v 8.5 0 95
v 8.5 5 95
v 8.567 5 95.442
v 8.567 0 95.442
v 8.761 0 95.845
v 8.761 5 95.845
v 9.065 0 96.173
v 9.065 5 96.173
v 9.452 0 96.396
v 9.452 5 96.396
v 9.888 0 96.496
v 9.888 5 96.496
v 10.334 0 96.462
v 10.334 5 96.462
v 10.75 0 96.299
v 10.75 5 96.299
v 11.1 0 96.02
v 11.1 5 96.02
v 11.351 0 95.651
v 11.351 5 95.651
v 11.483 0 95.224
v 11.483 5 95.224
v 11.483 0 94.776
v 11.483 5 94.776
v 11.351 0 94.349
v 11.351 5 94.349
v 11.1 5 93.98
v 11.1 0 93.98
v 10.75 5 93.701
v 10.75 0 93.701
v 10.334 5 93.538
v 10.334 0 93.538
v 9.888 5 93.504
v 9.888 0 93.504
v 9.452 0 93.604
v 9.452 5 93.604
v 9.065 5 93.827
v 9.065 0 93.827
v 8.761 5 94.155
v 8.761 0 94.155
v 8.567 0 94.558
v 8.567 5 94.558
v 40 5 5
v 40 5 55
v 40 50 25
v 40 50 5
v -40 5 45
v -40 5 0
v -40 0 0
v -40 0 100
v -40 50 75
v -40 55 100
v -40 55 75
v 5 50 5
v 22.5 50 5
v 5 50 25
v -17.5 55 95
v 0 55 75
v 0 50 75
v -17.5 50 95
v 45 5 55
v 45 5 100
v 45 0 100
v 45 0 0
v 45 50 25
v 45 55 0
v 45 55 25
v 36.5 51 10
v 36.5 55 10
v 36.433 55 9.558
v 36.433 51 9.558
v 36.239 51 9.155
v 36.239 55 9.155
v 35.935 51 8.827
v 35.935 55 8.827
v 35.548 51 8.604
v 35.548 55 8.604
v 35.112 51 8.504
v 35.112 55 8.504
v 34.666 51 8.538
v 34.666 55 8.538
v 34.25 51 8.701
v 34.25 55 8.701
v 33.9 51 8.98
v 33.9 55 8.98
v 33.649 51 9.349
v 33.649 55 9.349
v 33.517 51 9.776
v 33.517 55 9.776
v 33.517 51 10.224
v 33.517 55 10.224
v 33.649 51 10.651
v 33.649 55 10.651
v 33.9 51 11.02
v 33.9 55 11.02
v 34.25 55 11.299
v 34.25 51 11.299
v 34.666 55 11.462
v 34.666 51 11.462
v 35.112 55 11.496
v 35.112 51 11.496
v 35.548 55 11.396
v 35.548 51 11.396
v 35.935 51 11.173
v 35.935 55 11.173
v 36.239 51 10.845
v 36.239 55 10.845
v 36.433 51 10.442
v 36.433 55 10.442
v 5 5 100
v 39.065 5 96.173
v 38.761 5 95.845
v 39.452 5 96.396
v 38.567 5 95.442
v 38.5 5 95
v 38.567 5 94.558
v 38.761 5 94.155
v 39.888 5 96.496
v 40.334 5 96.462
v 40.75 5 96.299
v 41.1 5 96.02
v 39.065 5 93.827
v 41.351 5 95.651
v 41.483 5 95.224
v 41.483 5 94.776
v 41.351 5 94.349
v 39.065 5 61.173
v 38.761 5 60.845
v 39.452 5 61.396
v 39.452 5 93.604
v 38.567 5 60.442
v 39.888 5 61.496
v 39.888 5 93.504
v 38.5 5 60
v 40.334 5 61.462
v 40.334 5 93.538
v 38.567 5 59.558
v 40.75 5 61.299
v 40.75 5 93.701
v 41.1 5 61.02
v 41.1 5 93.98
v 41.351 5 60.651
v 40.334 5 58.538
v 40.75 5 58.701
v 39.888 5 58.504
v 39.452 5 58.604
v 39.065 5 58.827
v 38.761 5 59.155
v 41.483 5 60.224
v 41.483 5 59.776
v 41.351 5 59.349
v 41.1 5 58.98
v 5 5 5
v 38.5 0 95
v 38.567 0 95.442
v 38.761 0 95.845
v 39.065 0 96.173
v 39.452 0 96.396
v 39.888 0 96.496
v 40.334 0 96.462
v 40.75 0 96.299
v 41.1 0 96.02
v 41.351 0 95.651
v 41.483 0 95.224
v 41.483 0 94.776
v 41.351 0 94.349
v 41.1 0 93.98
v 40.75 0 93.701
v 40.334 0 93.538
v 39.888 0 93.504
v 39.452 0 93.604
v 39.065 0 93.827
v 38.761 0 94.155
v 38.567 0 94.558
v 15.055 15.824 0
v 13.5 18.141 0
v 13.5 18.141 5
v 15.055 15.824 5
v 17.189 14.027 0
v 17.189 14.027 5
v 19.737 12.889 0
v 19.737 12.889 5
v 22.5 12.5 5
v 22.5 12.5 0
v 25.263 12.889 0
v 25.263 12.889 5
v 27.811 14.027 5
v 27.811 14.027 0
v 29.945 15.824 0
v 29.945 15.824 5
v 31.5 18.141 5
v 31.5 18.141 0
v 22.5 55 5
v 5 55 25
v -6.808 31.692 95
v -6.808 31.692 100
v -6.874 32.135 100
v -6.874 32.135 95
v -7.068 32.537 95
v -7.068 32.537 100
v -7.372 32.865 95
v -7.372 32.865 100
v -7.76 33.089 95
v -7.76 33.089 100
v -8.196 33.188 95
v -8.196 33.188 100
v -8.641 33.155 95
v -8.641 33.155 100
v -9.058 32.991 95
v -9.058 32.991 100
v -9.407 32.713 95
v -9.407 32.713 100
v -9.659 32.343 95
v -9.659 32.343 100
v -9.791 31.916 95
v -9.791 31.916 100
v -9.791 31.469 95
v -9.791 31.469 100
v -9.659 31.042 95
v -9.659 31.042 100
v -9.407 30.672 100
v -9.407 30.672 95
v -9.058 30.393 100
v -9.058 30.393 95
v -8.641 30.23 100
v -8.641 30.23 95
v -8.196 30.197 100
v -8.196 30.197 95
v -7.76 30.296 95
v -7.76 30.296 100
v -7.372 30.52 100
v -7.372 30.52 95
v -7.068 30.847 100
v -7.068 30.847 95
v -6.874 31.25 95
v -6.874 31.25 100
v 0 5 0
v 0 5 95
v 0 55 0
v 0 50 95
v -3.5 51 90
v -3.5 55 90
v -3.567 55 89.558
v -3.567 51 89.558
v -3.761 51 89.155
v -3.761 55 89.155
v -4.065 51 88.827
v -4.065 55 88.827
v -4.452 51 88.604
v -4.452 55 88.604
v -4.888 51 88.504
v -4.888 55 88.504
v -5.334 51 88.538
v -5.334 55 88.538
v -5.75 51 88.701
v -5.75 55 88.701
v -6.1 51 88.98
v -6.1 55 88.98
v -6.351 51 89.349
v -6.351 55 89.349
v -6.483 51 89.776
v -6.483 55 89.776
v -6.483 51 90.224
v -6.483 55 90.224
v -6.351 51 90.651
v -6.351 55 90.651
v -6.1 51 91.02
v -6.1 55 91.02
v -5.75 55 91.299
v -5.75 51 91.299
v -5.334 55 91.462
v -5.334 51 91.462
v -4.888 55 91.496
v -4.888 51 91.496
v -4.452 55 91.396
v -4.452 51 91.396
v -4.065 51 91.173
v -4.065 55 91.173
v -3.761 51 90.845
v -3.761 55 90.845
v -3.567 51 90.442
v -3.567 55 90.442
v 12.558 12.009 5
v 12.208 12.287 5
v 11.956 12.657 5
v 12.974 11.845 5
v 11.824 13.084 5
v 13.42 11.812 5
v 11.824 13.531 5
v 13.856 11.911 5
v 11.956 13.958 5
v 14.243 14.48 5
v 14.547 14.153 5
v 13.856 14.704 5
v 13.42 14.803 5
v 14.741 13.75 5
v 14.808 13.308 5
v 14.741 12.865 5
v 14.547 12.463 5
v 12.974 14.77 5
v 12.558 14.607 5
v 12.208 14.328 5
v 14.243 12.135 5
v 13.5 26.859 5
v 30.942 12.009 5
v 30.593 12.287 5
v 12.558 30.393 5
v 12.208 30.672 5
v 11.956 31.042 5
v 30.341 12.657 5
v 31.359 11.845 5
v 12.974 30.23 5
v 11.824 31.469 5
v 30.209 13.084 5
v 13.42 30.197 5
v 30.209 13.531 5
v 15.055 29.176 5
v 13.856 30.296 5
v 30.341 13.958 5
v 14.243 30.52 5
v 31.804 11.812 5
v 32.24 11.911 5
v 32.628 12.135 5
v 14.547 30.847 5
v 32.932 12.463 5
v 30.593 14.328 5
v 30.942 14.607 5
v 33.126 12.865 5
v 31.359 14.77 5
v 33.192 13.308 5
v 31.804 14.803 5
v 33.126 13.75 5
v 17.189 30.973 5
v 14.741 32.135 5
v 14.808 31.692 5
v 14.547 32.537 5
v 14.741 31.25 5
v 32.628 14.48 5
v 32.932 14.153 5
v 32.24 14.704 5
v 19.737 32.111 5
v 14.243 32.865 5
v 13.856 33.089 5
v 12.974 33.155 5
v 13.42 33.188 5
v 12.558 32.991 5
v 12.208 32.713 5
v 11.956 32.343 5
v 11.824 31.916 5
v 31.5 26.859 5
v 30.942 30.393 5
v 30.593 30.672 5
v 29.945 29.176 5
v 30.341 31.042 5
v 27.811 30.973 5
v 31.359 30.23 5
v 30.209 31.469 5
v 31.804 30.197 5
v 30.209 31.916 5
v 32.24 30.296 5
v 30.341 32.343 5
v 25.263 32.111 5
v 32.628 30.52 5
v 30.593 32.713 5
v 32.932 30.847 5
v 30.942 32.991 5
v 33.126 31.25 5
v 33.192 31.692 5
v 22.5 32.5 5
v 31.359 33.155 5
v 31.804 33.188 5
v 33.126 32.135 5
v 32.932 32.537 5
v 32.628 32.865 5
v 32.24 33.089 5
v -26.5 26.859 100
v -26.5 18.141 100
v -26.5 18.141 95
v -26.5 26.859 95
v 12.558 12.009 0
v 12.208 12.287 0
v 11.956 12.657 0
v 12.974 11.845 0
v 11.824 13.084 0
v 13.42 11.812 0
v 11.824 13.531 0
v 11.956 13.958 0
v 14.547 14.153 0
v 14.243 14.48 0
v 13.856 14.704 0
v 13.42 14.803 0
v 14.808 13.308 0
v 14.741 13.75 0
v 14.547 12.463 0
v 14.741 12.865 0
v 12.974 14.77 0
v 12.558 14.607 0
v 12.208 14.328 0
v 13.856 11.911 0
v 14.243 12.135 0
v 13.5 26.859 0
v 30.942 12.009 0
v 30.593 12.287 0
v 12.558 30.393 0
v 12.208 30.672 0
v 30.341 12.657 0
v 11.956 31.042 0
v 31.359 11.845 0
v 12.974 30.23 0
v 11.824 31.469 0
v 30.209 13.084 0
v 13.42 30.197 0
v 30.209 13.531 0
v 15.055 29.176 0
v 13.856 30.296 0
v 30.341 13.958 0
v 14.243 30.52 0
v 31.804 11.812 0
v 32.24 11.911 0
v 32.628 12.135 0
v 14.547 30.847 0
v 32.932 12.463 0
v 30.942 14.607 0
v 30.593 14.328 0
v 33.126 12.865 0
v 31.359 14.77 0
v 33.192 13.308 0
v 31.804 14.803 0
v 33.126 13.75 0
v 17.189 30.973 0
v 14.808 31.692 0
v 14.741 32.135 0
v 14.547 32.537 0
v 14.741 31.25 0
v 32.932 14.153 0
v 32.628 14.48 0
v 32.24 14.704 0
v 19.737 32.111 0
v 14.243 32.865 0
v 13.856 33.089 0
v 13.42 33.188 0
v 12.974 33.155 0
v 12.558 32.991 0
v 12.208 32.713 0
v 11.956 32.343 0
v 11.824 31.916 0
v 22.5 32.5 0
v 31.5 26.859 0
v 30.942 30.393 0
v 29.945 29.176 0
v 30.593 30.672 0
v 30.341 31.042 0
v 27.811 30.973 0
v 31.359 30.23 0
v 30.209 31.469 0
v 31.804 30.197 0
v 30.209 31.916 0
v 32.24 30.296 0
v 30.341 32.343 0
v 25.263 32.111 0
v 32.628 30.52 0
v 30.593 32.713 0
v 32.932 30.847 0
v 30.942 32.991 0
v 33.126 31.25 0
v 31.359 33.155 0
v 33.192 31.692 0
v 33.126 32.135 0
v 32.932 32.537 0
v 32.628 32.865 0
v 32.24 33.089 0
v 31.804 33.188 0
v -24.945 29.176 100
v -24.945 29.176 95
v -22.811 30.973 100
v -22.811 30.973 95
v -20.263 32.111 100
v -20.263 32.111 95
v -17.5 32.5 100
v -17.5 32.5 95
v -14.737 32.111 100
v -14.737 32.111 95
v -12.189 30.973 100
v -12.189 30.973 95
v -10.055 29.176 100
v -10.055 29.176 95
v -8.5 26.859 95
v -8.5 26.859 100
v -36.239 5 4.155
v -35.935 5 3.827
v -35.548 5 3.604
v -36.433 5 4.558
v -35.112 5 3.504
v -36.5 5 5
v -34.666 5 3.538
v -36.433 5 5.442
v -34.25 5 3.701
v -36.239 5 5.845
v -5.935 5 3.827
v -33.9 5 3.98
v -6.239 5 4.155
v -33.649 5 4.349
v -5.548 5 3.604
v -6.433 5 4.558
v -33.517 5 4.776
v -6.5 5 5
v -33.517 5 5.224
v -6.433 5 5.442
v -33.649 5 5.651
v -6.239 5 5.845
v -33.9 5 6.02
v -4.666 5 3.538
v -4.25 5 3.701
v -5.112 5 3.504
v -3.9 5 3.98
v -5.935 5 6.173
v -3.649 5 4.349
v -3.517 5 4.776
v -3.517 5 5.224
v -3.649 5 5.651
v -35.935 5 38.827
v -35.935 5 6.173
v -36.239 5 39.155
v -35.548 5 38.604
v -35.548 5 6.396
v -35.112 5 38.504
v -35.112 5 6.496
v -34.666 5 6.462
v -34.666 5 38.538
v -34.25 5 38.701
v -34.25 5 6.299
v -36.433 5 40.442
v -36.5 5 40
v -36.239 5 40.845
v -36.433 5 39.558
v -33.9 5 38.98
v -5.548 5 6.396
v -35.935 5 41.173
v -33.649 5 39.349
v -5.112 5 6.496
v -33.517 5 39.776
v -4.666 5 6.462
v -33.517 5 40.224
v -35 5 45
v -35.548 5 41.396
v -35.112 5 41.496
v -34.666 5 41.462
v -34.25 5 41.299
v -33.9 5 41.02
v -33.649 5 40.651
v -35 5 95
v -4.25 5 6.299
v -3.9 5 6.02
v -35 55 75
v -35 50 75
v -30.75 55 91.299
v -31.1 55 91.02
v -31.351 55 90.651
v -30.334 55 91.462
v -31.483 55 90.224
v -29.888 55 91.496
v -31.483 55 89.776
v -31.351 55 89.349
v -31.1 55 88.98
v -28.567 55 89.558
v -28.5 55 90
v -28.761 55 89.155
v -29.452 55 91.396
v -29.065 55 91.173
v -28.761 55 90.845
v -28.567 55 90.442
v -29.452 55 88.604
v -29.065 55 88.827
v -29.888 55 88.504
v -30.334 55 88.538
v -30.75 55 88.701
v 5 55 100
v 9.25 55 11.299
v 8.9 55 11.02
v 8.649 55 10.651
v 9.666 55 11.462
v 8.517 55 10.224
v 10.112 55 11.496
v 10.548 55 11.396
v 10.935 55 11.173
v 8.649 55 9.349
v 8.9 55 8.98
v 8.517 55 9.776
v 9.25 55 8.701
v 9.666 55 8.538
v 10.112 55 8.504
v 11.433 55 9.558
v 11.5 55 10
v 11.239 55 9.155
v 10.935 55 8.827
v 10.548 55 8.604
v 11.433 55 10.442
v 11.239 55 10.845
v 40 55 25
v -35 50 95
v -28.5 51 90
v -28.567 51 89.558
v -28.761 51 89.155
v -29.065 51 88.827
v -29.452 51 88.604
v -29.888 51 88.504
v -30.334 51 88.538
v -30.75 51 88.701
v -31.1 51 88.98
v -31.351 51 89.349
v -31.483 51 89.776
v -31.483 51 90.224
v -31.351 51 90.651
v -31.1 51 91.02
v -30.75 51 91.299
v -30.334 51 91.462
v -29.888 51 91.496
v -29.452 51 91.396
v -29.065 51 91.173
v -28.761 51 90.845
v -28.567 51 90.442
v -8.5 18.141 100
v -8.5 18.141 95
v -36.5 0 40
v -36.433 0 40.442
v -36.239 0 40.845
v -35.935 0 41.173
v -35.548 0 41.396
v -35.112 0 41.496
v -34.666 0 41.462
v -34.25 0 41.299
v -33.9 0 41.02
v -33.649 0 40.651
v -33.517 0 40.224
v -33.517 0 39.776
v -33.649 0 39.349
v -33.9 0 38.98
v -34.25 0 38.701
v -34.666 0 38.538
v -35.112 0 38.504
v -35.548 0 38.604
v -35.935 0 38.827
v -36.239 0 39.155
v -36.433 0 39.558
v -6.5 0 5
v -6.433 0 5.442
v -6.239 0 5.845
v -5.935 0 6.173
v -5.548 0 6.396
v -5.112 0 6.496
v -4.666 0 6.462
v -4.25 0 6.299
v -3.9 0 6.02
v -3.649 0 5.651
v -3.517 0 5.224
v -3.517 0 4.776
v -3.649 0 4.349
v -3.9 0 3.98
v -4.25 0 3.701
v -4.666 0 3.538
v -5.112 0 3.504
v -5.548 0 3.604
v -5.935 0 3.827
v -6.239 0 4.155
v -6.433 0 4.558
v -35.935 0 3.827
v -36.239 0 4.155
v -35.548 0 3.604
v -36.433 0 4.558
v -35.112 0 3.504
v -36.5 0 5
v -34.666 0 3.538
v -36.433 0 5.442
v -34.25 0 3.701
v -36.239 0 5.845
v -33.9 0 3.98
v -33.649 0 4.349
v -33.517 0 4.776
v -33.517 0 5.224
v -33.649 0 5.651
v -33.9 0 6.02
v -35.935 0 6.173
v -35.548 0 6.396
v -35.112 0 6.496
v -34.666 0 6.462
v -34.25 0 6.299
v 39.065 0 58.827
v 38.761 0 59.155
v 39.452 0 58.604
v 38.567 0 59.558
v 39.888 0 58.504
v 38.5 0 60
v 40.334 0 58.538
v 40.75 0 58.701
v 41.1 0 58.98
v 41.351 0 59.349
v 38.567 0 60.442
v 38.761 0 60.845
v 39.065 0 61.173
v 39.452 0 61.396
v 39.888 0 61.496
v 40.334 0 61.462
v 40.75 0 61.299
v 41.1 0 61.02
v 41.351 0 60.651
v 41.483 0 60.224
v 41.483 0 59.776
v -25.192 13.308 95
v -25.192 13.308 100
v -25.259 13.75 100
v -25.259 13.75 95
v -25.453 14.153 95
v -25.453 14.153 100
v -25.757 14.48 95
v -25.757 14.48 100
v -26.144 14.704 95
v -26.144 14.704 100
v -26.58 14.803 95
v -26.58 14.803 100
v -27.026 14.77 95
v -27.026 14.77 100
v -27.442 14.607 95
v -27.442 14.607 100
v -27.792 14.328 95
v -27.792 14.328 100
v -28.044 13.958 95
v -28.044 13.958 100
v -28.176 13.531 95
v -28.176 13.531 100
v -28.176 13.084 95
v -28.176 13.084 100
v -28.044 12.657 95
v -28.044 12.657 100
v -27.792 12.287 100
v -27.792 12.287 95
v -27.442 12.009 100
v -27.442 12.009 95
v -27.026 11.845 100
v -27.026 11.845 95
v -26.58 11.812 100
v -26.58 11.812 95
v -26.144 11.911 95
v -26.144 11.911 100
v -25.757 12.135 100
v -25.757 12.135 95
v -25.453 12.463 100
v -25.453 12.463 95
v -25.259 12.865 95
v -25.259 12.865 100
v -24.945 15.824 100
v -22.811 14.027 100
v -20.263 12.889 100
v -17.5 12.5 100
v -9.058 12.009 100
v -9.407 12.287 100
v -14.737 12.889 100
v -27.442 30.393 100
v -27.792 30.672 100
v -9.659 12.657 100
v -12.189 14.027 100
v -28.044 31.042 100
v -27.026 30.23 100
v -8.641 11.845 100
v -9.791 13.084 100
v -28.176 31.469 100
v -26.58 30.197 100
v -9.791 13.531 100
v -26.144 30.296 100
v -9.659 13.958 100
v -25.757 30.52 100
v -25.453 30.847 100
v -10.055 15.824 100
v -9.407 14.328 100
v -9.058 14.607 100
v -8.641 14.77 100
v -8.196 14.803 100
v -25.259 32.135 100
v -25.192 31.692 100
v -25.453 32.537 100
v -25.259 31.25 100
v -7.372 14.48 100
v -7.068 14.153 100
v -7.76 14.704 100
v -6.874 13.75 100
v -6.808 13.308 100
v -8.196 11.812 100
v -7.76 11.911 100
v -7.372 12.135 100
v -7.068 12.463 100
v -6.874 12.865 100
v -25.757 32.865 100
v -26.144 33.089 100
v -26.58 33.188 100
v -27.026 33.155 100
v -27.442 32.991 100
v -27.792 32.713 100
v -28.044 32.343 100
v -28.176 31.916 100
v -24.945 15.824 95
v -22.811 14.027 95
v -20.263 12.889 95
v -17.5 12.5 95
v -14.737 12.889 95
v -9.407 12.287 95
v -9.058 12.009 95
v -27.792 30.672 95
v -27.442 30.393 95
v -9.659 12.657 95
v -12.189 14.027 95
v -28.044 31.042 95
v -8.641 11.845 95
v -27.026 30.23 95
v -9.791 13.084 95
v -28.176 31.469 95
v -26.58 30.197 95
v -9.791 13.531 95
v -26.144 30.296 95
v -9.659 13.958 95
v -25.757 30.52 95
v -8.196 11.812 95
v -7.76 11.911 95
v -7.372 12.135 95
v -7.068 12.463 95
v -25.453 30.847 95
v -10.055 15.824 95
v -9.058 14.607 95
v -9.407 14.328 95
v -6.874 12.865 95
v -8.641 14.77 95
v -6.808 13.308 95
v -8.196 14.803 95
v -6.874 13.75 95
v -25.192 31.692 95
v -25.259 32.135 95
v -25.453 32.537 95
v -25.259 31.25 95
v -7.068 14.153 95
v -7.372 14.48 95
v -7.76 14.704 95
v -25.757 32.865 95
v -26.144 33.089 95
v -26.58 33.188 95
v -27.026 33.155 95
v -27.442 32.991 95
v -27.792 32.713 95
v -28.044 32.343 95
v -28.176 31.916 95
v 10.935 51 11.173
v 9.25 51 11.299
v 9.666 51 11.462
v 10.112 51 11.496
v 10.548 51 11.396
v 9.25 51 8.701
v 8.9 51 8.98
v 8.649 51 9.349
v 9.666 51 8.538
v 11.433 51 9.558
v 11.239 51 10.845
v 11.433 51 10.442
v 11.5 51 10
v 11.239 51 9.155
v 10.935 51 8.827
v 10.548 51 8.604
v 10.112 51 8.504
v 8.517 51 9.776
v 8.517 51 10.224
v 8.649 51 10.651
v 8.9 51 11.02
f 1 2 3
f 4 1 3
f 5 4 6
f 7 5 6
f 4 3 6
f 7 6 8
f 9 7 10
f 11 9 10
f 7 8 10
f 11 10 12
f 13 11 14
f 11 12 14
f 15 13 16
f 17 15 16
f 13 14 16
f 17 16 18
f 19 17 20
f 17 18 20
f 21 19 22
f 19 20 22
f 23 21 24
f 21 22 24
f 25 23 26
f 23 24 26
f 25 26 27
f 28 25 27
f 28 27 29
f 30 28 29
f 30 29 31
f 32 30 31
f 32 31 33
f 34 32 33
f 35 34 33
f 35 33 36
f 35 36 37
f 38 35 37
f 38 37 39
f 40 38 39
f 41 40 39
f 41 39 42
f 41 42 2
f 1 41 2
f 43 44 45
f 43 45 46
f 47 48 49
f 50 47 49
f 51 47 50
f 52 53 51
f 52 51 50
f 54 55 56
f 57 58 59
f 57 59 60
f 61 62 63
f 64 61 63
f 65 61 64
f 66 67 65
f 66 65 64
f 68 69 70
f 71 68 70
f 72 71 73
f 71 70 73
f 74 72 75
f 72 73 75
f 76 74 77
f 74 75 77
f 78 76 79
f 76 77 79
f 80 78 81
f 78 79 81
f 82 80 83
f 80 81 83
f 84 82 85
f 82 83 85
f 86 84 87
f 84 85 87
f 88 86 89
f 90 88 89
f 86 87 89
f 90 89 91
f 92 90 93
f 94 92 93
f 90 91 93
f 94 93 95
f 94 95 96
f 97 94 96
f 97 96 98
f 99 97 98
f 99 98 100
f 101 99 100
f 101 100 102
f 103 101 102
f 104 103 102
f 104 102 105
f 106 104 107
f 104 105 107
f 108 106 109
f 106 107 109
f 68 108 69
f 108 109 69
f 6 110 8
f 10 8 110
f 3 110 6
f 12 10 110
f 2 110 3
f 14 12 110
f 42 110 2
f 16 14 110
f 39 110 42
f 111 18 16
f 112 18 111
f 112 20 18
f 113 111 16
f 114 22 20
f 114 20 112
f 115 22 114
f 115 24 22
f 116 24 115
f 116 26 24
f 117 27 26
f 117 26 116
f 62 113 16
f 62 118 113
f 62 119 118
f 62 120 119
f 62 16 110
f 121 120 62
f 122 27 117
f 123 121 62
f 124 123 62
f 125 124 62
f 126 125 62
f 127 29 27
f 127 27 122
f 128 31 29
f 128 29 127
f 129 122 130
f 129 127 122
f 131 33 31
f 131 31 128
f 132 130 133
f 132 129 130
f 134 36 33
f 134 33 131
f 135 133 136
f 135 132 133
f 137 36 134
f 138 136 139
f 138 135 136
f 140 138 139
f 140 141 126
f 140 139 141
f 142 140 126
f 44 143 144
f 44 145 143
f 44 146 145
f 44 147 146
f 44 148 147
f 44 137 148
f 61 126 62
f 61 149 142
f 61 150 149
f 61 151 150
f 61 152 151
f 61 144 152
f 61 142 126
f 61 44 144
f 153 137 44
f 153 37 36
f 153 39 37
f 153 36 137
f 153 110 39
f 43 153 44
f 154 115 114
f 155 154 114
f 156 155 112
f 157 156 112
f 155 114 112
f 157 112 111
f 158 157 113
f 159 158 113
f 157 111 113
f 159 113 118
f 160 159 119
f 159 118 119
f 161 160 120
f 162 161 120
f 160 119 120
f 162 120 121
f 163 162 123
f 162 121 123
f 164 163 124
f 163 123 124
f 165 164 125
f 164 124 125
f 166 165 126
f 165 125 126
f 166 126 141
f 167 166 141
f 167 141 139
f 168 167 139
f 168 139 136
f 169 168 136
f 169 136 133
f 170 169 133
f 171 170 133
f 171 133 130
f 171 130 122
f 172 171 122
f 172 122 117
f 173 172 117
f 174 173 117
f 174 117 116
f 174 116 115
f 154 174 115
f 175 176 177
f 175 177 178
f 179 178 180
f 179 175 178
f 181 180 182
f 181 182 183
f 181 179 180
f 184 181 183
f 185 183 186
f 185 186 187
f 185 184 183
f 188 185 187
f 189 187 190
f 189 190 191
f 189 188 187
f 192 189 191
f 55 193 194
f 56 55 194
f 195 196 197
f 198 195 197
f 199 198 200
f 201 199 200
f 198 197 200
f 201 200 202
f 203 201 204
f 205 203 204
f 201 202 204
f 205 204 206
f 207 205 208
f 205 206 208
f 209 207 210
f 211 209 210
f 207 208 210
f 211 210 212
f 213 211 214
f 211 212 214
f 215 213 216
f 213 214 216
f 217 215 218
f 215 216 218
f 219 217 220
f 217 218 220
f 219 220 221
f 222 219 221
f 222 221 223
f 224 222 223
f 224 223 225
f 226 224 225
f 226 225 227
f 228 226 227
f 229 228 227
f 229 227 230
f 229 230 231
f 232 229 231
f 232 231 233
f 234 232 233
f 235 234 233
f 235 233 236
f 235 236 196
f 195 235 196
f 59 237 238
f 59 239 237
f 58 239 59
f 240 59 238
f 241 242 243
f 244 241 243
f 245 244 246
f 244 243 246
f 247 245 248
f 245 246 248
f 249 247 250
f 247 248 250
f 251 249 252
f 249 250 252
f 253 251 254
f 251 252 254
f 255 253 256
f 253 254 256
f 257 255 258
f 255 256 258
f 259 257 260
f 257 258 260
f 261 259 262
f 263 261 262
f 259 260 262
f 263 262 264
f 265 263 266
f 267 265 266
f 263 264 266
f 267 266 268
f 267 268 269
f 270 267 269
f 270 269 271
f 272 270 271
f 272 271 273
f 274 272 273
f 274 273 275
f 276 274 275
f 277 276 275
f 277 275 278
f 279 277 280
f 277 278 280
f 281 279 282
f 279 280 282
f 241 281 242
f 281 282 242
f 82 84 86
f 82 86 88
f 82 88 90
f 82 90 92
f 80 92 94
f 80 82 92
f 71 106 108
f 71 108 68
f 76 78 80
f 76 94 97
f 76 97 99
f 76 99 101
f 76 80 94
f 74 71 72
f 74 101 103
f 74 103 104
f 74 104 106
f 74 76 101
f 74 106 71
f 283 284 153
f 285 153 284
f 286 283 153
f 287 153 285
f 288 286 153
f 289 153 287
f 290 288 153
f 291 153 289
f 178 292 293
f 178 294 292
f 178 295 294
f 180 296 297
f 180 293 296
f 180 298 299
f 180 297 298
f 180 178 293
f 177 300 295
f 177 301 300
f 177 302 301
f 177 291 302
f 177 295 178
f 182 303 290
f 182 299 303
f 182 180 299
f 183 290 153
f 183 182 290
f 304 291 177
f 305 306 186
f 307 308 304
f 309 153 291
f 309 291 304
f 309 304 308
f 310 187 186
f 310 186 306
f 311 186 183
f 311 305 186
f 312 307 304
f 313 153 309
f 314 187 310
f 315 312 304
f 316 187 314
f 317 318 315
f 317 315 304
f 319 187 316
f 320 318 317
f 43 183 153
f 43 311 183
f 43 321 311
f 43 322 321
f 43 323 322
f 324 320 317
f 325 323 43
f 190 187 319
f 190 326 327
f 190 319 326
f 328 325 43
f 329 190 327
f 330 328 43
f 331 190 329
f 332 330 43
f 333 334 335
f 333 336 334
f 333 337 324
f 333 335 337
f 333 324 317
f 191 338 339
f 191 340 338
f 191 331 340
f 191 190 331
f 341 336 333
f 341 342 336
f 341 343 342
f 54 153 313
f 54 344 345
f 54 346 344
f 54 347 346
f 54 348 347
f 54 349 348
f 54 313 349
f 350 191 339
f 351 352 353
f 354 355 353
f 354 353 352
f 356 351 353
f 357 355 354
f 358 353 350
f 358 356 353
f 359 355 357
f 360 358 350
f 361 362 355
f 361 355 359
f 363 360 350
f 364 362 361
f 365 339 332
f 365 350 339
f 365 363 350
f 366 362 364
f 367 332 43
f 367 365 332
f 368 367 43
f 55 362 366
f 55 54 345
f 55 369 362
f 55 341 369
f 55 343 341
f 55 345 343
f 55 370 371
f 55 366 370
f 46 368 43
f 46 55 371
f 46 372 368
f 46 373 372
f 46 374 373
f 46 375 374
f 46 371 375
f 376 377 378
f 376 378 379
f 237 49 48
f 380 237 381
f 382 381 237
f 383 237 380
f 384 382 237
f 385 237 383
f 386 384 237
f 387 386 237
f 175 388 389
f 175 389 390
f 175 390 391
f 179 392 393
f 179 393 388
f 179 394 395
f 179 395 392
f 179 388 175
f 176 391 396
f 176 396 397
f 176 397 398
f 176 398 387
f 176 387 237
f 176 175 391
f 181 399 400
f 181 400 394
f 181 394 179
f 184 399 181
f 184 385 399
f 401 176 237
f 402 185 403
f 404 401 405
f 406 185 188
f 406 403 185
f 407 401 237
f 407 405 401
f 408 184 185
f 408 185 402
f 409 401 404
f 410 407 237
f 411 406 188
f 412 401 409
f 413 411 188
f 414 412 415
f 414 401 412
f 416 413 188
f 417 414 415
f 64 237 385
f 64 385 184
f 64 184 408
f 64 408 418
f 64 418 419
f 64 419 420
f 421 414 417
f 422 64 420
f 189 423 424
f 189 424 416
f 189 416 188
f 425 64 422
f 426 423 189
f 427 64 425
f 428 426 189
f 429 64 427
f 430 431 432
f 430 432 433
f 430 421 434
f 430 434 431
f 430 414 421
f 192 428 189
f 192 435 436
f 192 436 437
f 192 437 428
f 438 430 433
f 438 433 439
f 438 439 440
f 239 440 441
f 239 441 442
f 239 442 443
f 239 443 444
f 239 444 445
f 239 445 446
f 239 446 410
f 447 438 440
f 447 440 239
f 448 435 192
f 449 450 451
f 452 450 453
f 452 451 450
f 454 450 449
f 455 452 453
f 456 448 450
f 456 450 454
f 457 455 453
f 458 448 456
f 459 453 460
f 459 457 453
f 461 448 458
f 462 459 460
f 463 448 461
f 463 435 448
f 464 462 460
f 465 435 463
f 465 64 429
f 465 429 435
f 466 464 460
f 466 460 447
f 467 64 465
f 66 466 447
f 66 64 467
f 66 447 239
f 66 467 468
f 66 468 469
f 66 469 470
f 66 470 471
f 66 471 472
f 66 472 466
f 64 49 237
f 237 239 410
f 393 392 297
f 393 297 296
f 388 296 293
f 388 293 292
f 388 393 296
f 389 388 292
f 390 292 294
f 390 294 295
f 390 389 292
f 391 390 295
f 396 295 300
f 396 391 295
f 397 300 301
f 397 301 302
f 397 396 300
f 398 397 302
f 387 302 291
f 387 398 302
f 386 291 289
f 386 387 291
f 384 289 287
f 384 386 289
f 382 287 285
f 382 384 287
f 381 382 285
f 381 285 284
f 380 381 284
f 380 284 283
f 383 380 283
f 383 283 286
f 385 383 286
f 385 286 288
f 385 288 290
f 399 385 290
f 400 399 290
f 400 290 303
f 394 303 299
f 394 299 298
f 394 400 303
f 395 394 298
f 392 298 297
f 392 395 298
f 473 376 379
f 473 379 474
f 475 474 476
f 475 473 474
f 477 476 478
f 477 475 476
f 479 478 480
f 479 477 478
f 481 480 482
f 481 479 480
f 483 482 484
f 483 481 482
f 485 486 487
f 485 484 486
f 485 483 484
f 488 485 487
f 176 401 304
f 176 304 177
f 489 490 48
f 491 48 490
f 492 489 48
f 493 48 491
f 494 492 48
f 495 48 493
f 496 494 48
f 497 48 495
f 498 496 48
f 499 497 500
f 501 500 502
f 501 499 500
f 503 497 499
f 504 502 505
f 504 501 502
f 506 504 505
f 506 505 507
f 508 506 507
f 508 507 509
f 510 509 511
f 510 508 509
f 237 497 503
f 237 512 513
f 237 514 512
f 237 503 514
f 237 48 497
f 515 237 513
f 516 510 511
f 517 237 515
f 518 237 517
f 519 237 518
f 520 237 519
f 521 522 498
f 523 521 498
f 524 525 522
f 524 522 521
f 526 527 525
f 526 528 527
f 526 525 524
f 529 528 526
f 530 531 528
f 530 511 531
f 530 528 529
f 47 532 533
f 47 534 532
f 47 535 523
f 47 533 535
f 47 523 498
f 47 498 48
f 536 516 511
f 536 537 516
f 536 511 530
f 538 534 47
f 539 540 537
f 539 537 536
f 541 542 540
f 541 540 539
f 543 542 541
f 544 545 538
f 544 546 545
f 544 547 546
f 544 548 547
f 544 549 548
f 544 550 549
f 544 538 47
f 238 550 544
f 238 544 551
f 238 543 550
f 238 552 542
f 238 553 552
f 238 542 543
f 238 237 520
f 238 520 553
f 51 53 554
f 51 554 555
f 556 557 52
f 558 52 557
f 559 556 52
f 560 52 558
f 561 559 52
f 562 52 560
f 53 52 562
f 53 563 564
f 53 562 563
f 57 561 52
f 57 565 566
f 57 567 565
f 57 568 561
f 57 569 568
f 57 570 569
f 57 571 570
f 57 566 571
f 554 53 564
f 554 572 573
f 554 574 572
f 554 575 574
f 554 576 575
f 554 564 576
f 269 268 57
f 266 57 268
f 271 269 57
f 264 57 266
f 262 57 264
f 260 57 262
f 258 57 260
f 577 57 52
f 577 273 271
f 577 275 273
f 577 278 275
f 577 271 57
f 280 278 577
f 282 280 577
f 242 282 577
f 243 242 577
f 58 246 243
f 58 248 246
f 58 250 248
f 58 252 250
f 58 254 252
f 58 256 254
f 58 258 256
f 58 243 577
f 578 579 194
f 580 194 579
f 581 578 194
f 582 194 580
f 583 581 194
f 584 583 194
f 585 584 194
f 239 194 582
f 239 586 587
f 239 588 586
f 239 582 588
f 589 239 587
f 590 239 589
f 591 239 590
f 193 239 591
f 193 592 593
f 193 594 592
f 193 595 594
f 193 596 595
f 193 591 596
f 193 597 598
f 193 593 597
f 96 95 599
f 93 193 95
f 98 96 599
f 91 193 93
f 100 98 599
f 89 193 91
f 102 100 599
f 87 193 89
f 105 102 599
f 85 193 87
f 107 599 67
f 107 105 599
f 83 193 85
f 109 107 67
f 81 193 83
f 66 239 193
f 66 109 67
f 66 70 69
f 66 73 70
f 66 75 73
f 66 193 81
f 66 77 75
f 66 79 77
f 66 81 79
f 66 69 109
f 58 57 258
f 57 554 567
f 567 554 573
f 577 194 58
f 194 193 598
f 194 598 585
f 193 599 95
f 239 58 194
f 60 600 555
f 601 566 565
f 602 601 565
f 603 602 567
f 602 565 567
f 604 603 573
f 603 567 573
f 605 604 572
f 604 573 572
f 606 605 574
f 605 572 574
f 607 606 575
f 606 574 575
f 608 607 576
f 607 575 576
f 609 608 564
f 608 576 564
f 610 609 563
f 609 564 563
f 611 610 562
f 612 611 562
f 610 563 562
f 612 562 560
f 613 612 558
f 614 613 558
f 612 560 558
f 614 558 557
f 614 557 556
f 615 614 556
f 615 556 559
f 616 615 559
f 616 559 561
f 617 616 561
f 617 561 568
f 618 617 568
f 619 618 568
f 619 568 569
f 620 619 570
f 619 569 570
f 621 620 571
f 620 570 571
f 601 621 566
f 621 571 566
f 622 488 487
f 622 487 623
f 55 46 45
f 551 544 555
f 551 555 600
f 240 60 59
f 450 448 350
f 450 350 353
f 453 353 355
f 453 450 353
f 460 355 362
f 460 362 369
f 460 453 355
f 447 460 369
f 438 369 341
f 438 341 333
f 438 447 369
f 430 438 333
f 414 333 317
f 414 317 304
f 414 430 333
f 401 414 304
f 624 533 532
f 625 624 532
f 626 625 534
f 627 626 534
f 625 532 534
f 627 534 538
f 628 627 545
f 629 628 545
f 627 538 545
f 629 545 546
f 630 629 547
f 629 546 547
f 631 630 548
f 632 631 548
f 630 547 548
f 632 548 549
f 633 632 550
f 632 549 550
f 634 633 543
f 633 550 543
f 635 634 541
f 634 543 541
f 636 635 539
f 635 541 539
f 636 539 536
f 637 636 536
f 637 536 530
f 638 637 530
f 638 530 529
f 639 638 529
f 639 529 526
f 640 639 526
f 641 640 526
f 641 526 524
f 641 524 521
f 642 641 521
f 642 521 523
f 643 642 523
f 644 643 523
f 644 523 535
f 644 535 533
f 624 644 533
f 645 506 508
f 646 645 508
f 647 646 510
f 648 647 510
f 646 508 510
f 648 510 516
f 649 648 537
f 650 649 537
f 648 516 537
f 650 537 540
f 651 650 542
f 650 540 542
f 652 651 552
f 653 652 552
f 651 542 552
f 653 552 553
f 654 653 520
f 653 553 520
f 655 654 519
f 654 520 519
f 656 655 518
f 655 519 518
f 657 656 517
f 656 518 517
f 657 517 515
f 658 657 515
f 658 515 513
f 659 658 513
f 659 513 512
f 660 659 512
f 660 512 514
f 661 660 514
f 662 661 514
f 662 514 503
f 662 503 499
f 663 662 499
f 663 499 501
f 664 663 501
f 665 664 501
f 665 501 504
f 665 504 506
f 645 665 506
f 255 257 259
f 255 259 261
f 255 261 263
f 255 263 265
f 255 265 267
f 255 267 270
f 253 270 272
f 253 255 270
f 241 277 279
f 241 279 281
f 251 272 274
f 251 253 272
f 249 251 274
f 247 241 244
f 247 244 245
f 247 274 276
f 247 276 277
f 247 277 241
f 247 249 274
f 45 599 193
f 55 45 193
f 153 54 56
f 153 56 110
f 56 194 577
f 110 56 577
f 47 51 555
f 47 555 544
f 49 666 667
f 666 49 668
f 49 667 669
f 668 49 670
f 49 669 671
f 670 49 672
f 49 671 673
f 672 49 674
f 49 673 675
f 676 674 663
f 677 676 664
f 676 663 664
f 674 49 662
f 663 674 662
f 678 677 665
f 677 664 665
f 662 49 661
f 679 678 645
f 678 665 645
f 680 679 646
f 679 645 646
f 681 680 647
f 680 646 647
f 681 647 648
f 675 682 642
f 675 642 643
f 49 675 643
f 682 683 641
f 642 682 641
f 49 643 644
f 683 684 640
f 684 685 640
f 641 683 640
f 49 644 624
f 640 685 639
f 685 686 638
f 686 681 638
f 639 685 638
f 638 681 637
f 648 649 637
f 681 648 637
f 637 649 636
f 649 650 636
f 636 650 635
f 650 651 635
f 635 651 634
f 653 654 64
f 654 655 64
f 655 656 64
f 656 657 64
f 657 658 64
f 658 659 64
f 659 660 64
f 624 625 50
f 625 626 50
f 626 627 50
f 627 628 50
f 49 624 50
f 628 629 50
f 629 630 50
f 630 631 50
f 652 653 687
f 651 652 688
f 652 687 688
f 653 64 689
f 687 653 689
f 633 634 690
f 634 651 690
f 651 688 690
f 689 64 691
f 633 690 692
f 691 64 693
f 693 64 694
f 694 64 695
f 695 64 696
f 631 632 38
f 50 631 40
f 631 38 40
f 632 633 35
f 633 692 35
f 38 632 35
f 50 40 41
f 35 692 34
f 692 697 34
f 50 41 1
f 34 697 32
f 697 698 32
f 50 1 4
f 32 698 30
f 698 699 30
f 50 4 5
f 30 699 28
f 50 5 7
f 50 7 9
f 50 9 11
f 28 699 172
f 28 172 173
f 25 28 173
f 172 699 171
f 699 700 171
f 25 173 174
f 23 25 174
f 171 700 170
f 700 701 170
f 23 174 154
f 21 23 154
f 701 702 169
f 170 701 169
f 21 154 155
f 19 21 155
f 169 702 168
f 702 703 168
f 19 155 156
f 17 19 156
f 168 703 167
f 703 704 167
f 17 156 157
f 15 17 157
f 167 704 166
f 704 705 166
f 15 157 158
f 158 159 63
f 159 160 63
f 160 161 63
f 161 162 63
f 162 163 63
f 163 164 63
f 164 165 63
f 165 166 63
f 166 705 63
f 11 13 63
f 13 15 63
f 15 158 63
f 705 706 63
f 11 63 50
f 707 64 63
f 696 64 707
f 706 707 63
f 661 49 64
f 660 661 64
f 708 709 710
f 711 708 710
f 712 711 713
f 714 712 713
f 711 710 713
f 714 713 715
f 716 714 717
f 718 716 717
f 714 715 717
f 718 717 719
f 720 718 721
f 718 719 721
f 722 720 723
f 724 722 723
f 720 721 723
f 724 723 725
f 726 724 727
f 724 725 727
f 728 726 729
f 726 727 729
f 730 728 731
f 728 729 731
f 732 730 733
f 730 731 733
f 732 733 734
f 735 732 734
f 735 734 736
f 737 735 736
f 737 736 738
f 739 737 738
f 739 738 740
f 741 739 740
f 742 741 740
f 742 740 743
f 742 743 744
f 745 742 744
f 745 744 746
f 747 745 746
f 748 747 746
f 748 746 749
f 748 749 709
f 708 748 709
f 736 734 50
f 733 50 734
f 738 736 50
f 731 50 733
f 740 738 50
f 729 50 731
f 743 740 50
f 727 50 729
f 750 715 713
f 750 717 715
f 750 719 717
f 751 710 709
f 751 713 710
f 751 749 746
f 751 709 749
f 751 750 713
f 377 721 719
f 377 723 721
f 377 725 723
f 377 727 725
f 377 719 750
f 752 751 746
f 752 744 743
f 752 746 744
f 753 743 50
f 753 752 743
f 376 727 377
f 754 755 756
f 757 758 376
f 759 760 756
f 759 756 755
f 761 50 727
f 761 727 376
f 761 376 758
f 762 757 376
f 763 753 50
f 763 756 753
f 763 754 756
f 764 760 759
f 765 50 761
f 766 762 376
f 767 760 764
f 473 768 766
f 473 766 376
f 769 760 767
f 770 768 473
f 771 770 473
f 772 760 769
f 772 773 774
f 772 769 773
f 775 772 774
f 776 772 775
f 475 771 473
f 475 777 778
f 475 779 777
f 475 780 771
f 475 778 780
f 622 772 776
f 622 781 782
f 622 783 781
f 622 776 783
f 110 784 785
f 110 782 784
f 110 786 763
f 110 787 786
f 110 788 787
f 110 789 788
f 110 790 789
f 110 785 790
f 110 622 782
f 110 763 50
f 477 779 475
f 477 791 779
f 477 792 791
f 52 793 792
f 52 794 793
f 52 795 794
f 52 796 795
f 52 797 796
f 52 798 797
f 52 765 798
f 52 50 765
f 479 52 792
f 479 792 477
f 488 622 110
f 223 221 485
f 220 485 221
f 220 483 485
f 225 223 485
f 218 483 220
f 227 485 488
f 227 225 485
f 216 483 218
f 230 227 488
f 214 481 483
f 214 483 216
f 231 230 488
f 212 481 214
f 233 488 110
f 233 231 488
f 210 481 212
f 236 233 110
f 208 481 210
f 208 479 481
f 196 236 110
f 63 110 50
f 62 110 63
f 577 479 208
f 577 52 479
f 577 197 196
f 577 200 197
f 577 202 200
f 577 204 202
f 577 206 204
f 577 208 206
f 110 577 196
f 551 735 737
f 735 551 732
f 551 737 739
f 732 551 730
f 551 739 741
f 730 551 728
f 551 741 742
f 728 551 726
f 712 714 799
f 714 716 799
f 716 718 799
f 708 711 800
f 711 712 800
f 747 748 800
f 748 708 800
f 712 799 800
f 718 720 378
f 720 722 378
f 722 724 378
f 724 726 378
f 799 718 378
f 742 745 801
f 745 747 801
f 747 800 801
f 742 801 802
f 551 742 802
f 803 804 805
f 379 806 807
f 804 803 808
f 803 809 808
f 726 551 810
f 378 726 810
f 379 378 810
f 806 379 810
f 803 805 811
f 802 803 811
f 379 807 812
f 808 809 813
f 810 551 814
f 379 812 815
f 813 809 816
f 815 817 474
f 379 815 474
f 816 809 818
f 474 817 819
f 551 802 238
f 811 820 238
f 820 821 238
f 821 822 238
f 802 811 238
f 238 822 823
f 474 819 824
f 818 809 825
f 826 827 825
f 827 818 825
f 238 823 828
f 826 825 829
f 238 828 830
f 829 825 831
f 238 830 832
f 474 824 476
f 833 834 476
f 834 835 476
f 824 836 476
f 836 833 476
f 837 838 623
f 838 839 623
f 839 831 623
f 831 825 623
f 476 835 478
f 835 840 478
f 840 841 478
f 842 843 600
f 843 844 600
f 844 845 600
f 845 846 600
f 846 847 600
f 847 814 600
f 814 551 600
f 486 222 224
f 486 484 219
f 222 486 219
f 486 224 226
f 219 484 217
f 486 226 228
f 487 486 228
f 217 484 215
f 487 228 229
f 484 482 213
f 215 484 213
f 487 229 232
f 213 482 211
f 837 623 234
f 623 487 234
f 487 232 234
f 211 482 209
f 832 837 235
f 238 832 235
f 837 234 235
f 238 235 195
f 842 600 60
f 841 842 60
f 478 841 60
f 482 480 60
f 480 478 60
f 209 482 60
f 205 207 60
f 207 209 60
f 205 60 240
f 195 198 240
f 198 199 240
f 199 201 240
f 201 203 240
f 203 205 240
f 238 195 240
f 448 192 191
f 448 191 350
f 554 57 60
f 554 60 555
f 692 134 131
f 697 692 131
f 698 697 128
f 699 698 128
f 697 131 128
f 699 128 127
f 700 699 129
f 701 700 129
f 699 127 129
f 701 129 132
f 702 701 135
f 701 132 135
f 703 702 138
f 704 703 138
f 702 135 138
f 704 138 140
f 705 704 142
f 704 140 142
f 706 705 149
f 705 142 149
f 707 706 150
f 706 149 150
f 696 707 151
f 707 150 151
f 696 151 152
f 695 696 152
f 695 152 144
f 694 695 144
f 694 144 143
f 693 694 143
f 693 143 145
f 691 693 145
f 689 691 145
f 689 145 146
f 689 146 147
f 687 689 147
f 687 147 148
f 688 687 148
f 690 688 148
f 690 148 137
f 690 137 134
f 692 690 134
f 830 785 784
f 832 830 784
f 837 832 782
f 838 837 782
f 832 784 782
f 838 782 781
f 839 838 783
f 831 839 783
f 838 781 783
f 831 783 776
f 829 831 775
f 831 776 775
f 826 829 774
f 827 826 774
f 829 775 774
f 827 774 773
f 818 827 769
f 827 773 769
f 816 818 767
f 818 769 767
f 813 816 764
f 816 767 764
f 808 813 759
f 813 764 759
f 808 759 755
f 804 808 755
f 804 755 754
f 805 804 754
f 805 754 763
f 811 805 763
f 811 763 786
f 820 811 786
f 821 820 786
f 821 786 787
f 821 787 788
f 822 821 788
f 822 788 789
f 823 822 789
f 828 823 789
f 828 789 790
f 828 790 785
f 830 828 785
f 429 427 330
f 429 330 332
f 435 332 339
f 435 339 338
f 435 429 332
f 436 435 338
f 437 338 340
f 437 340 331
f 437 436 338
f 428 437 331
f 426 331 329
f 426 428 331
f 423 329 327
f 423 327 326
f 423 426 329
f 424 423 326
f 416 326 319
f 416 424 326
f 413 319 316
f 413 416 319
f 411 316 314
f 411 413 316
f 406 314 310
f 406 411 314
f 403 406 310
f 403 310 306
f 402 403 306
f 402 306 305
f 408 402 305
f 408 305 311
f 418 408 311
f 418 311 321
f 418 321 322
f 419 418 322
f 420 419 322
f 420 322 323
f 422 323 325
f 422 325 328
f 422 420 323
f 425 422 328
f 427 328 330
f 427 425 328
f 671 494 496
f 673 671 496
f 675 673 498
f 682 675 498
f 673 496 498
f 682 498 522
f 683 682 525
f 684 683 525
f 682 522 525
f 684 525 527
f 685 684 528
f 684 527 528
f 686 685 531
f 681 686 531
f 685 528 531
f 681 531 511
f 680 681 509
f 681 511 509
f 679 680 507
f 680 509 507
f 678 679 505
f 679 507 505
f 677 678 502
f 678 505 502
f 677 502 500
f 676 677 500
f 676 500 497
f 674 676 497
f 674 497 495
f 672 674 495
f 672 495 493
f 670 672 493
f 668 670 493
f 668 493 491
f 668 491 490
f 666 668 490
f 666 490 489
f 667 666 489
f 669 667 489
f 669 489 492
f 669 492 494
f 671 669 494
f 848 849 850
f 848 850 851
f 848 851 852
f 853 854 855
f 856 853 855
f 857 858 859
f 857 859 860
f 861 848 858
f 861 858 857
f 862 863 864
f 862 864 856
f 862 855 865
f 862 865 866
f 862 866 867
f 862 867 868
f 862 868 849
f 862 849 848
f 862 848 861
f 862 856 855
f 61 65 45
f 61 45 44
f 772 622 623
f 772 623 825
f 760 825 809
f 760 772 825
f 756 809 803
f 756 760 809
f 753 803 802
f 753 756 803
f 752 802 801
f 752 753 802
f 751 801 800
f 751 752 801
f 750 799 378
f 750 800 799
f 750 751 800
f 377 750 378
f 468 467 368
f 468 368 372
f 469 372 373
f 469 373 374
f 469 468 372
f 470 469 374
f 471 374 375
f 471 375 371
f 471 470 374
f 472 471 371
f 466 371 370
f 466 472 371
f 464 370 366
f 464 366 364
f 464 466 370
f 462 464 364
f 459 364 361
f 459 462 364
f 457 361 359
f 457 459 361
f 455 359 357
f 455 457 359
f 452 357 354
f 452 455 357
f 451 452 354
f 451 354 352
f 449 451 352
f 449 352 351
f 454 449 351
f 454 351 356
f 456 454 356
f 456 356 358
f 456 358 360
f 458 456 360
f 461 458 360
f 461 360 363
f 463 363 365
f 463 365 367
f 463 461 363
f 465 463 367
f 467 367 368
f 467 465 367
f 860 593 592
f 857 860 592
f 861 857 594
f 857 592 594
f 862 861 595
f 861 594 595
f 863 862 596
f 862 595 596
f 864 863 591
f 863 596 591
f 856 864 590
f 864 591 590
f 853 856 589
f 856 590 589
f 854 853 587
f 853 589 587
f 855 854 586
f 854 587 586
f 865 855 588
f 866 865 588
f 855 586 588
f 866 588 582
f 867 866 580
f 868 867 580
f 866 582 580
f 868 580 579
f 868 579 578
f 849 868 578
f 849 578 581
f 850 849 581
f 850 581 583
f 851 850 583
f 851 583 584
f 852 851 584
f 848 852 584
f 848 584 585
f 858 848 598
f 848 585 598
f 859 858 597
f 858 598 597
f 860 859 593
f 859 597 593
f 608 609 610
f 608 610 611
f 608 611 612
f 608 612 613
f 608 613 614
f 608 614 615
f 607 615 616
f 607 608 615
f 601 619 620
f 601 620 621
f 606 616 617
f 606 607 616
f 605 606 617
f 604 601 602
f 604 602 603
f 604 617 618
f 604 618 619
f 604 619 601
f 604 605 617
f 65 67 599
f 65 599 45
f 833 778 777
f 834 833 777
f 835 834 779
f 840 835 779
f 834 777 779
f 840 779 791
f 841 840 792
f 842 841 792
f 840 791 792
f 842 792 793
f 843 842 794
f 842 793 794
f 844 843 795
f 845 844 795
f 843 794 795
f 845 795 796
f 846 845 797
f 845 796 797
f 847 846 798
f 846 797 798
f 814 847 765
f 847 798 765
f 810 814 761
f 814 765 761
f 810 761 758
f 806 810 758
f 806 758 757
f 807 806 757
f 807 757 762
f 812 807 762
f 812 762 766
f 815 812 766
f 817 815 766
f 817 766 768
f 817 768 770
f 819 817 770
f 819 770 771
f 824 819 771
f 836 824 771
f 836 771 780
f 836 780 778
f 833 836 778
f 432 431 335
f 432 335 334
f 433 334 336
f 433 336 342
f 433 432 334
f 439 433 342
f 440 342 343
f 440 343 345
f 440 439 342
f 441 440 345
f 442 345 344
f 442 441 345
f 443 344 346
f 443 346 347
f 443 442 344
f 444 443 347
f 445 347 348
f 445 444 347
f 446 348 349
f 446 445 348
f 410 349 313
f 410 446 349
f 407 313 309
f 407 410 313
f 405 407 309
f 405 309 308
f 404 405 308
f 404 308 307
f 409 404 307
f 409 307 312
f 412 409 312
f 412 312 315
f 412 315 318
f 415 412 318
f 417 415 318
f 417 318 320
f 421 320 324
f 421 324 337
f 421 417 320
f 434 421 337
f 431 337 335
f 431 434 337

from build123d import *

# Parameters (mm, degrees)
ESQUISSE1_R             = 1.5
EXTRUSION1_DEPTH        = 5
ESQUISSE2_W             = 45
ESQUISSE2_H             = 5
EXTRUSION2_DEPTH        = 95
EXTRUSION3_DEPTH        = 5
ESQUISSE4_W             = 95
ESQUISSE4_H             = 50
EXTRUSION4_DEPTH        = 5
ESQUISSE5_W             = 100
ESQUISSE5_H             = 5
EXTRUSION5_DEPTH        = 40
ESQUISSE6_W             = 40
ESQUISSE6_H             = 50
EXTRUSION6_DEPTH        = 5
EXTRUSION7_DEPTH        = 5
ENL_V_MAT_EXTRU_1_REACH = 102
ESQUISSE8_R             = 1.5
ENL_V_MAT_EXTRU_2_REACH = 7
ESQUISSE9_R             = 1.5
BOSS_EXTRU_1_DEPTH      = 5
BOSS_EXTRU_2_DEPTH      = 5
ESQUISSE16_R            = 1.5
ENL_V_MAT_EXTRU_3_DEPTH = 4


with BuildPart() as part:
    # Esquisse1 → Extrusion1 (new body)
    with BuildSketch(Plane.XY):
        Polygon((0, 0), (45, 0), (45, 45), (45, 55), (0, 55), (0, 45), align=None)
        with Locations((31.692388155, 31.692388155)):
            Circle(ESQUISSE1_R, mode=Mode.SUBTRACT)
        with Locations((31.692388155, 13.307611845)):
            Circle(ESQUISSE1_R, mode=Mode.SUBTRACT)
        with Locations((13.307611845, 13.307611845)):
            Circle(ESQUISSE1_R, mode=Mode.SUBTRACT)
        with Locations((13.307611845, 31.692388155)):
            Circle(ESQUISSE1_R, mode=Mode.SUBTRACT)
        with BuildLine():
            Line((13.5, 26.858898944), (13.5, 18.141101056))
            ThreePointArc((13.5, 18.141101056), (22.5, 12.5), (31.5, 18.141101056))
            Line((31.5, 18.141101056), (31.5, 26.858898944))
            ThreePointArc((31.5, 26.858898944), (22.5, 32.5), (13.5, 26.858898944))
        make_face(mode=Mode.SUBTRACT)
    extrude(amount=EXTRUSION1_DEPTH)

    # Esquisse2 → Extrusion2 (add)
    with BuildSketch(Plane.XY.offset(5)):
        with Locations((22.5, 2.5)):
            Rectangle(ESQUISSE2_W, ESQUISSE2_H)
    extrude(amount=EXTRUSION2_DEPTH)

    # Esquisse3 → Extrusion3 (add)
    with BuildSketch(Plane(origin=(45, 0, 0), x_dir=(0, 0, -1), z_dir=(1, 0, 0))):
        Polygon((-5, 5), (-5, 55), (-25, 55), (-25, 50), (-55, 5), align=None)
    extrude(amount=-EXTRUSION3_DEPTH)

    # Esquisse4 → Extrusion4 (add)
    with BuildSketch(Plane.ZY):
        with Locations((52.5, 30)):
            Rectangle(ESQUISSE4_W, ESQUISSE4_H)
    extrude(amount=-EXTRUSION4_DEPTH)

    # Esquisse5 → Extrusion5 (add)
    with BuildSketch(Plane.ZY):
        with Locations((50, 2.5)):
            Rectangle(ESQUISSE5_W, ESQUISSE5_H)
    extrude(amount=EXTRUSION5_DEPTH)

    # Esquisse6 → Extrusion6 (add)
    with BuildSketch(Plane.XY.offset(100)):
        with Locations((-20, 30)):
            Rectangle(ESQUISSE6_W, ESQUISSE6_H)
    extrude(amount=-EXTRUSION6_DEPTH)

    # Esquisse7 → Extrusion7 (add)
    with BuildSketch(Plane.ZY.offset(40)):
        Polygon((95, 5), (95, 55), (75, 55), (75, 50), (45, 5), align=None)
    extrude(amount=-EXTRUSION7_DEPTH)

    # Esquisse8 → Enlèv. mat.-Extru.1 (cut, up to next)
    with BuildSketch(Plane.XY.offset(100), mode=Mode.PRIVATE) as enl_v_mat_extru_1_sk1:
        with Locations((-8.307611845, 13.307611845)):
            Circle(ESQUISSE8_R)
    enl_v_mat_extru_1_tool1 = extrude(enl_v_mat_extru_1_sk1.sketch, amount=-ENL_V_MAT_EXTRU_1_REACH, mode=Mode.PRIVATE) & part.part
    add(enl_v_mat_extru_1_tool1.solids().sort_by_distance((-8.307612, 13.307612, 100))[0], mode=Mode.SUBTRACT)
    # Esquisse8 → Enlèv. mat.-Extru.1 (cut, up to next)
    with BuildSketch(Plane.XY.offset(100), mode=Mode.PRIVATE) as enl_v_mat_extru_1_sk2:
        with Locations((-8.307611845, 31.692388155)):
            Circle(ESQUISSE8_R)
    enl_v_mat_extru_1_tool2 = extrude(enl_v_mat_extru_1_sk2.sketch, amount=-ENL_V_MAT_EXTRU_1_REACH, mode=Mode.PRIVATE) & part.part
    add(enl_v_mat_extru_1_tool2.solids().sort_by_distance((-8.307612, 31.692388, 100))[0], mode=Mode.SUBTRACT)
    # Esquisse8 → Enlèv. mat.-Extru.1 (cut, up to next)
    with BuildSketch(Plane.XY.offset(100), mode=Mode.PRIVATE) as enl_v_mat_extru_1_sk3:
        with Locations((-26.692388155, 31.692388155)):
            Circle(ESQUISSE8_R)
    enl_v_mat_extru_1_tool3 = extrude(enl_v_mat_extru_1_sk3.sketch, amount=-ENL_V_MAT_EXTRU_1_REACH, mode=Mode.PRIVATE) & part.part
    add(enl_v_mat_extru_1_tool3.solids().sort_by_distance((-26.692388, 31.692388, 100))[0], mode=Mode.SUBTRACT)
    # Esquisse8 → Enlèv. mat.-Extru.1 (cut, up to next)
    with BuildSketch(Plane.XY.offset(100), mode=Mode.PRIVATE) as enl_v_mat_extru_1_sk4:
        with Locations((-26.692388155, 13.307611845)):
            Circle(ESQUISSE8_R)
    enl_v_mat_extru_1_tool4 = extrude(enl_v_mat_extru_1_sk4.sketch, amount=-ENL_V_MAT_EXTRU_1_REACH, mode=Mode.PRIVATE) & part.part
    add(enl_v_mat_extru_1_tool4.solids().sort_by_distance((-26.692388, 13.307612, 100))[0], mode=Mode.SUBTRACT)
    # Esquisse8 → Enlèv. mat.-Extru.1 (cut, up to next)
    with BuildSketch(Plane.XY.offset(100), mode=Mode.PRIVATE) as enl_v_mat_extru_1_sk5:
        with BuildLine():
            Line((-26.5, 18.141101056), (-26.5, 26.858898944))
            ThreePointArc((-26.5, 26.858898944), (-17.5, 32.5), (-8.5, 26.858898944))
            Line((-8.5, 26.858898944), (-8.5, 18.141101056))
            ThreePointArc((-8.5, 18.141101056), (-17.5, 12.5), (-26.5, 18.141101056))
        make_face()
    enl_v_mat_extru_1_tool5 = extrude(enl_v_mat_extru_1_sk5.sketch, amount=-ENL_V_MAT_EXTRU_1_REACH, mode=Mode.PRIVATE) & part.part
    add(enl_v_mat_extru_1_tool5.solids().sort_by_distance((-17.5, 22.5, 100))[0], mode=Mode.SUBTRACT)

    # Esquisse9 → Enlèv. mat.-Extru.2 (cut, up to next)
    with BuildSketch(Plane(origin=(0, 5, 0), x_dir=(-1, 0, 0), z_dir=(0, 1, 0)), mode=Mode.PRIVATE) as enl_v_mat_extru_2_sk1:
        with Locations((-40, 95)):
            Circle(ESQUISSE9_R)
    enl_v_mat_extru_2_tool1 = extrude(enl_v_mat_extru_2_sk1.sketch, amount=-ENL_V_MAT_EXTRU_2_REACH, mode=Mode.PRIVATE) & part.part
    add(enl_v_mat_extru_2_tool1.solids().sort_by_distance((40, 5, 95))[0], mode=Mode.SUBTRACT)
    # Esquisse9 → Enlèv. mat.-Extru.2 (cut, up to next)
    with BuildSketch(Plane(origin=(0, 5, 0), x_dir=(-1, 0, 0), z_dir=(0, 1, 0)), mode=Mode.PRIVATE) as enl_v_mat_extru_2_sk2:
        with Locations((-10, 95)):
            Circle(ESQUISSE9_R)
    enl_v_mat_extru_2_tool2 = extrude(enl_v_mat_extru_2_sk2.sketch, amount=-ENL_V_MAT_EXTRU_2_REACH, mode=Mode.PRIVATE) & part.part
    add(enl_v_mat_extru_2_tool2.solids().sort_by_distance((10, 5, 95))[0], mode=Mode.SUBTRACT)
    # Esquisse9 → Enlèv. mat.-Extru.2 (cut, up to next)
    with BuildSketch(Plane(origin=(0, 5, 0), x_dir=(-1, 0, 0), z_dir=(0, 1, 0)), mode=Mode.PRIVATE) as enl_v_mat_extru_2_sk3:
        with Locations((35, 5)):
            Circle(ESQUISSE9_R)
    enl_v_mat_extru_2_tool3 = extrude(enl_v_mat_extru_2_sk3.sketch, amount=-ENL_V_MAT_EXTRU_2_REACH, mode=Mode.PRIVATE) & part.part
    add(enl_v_mat_extru_2_tool3.solids().sort_by_distance((-35, 5, 5))[0], mode=Mode.SUBTRACT)
    # Esquisse9 → Enlèv. mat.-Extru.2 (cut, up to next)
    with BuildSketch(Plane(origin=(0, 5, 0), x_dir=(-1, 0, 0), z_dir=(0, 1, 0)), mode=Mode.PRIVATE) as enl_v_mat_extru_2_sk4:
        with Locations((5, 5)):
            Circle(ESQUISSE9_R)
    enl_v_mat_extru_2_tool4 = extrude(enl_v_mat_extru_2_sk4.sketch, amount=-ENL_V_MAT_EXTRU_2_REACH, mode=Mode.PRIVATE) & part.part
    add(enl_v_mat_extru_2_tool4.solids().sort_by_distance((-5, 5, 5))[0], mode=Mode.SUBTRACT)
    # Esquisse9 → Enlèv. mat.-Extru.2 (cut, up to next)
    with BuildSketch(Plane(origin=(0, 5, 0), x_dir=(-1, 0, 0), z_dir=(0, 1, 0)), mode=Mode.PRIVATE) as enl_v_mat_extru_2_sk5:
        with Locations((-40, 60)):
            Circle(ESQUISSE9_R)
    enl_v_mat_extru_2_tool5 = extrude(enl_v_mat_extru_2_sk5.sketch, amount=-ENL_V_MAT_EXTRU_2_REACH, mode=Mode.PRIVATE) & part.part
    add(enl_v_mat_extru_2_tool5.solids().sort_by_distance((40, 5, 60))[0], mode=Mode.SUBTRACT)
    # Esquisse9 → Enlèv. mat.-Extru.2 (cut, up to next)
    with BuildSketch(Plane(origin=(0, 5, 0), x_dir=(-1, 0, 0), z_dir=(0, 1, 0)), mode=Mode.PRIVATE) as enl_v_mat_extru_2_sk6:
        with Locations((35, 40)):
            Circle(ESQUISSE9_R)
    enl_v_mat_extru_2_tool6 = extrude(enl_v_mat_extru_2_sk6.sketch, amount=-ENL_V_MAT_EXTRU_2_REACH, mode=Mode.PRIVATE) & part.part
    add(enl_v_mat_extru_2_tool6.solids().sort_by_distance((-35, 5, 40))[0], mode=Mode.SUBTRACT)

    # Esquisse11 → Boss.-Extru.1 (add)
    with BuildSketch(Plane(origin=(0, 55, 0), x_dir=(1, 0, 0), z_dir=(0, 1, 0))):
        Polygon((22.5, -5), (5, -25), (5, 0), (40, 0), (40, -25), align=None)
    extrude(amount=-BOSS_EXTRU_1_DEPTH)

    # Esquisse12 → Boss.-Extru.2 (add)
    with BuildSketch(Plane(origin=(0, 55, 0), x_dir=(1, 0, 0), z_dir=(0, 1, 0))):
        Polygon((0, -75), (-17.5, -95), (-35, -75), (-35, -100), (0, -100), align=None)
    extrude(amount=-BOSS_EXTRU_2_DEPTH)

    # Esquisse16 → Enlèv. mat.-Extru.3 (cut)
    with BuildSketch(Plane(origin=(0, 55, 0), x_dir=(1, 0, 0), z_dir=(0, 1, 0))):
        with Locations((-5, -90)):
            Circle(ESQUISSE16_R)
        with Locations((-30, -90)):
            Circle(ESQUISSE16_R)
        with Locations((10, -10)):
            Circle(ESQUISSE16_R)
        with Locations((35, -10)):
            Circle(ESQUISSE16_R)
    extrude(amount=-ENL_V_MAT_EXTRU_3_DEPTH, mode=Mode.SUBTRACT)


solid = part.part
